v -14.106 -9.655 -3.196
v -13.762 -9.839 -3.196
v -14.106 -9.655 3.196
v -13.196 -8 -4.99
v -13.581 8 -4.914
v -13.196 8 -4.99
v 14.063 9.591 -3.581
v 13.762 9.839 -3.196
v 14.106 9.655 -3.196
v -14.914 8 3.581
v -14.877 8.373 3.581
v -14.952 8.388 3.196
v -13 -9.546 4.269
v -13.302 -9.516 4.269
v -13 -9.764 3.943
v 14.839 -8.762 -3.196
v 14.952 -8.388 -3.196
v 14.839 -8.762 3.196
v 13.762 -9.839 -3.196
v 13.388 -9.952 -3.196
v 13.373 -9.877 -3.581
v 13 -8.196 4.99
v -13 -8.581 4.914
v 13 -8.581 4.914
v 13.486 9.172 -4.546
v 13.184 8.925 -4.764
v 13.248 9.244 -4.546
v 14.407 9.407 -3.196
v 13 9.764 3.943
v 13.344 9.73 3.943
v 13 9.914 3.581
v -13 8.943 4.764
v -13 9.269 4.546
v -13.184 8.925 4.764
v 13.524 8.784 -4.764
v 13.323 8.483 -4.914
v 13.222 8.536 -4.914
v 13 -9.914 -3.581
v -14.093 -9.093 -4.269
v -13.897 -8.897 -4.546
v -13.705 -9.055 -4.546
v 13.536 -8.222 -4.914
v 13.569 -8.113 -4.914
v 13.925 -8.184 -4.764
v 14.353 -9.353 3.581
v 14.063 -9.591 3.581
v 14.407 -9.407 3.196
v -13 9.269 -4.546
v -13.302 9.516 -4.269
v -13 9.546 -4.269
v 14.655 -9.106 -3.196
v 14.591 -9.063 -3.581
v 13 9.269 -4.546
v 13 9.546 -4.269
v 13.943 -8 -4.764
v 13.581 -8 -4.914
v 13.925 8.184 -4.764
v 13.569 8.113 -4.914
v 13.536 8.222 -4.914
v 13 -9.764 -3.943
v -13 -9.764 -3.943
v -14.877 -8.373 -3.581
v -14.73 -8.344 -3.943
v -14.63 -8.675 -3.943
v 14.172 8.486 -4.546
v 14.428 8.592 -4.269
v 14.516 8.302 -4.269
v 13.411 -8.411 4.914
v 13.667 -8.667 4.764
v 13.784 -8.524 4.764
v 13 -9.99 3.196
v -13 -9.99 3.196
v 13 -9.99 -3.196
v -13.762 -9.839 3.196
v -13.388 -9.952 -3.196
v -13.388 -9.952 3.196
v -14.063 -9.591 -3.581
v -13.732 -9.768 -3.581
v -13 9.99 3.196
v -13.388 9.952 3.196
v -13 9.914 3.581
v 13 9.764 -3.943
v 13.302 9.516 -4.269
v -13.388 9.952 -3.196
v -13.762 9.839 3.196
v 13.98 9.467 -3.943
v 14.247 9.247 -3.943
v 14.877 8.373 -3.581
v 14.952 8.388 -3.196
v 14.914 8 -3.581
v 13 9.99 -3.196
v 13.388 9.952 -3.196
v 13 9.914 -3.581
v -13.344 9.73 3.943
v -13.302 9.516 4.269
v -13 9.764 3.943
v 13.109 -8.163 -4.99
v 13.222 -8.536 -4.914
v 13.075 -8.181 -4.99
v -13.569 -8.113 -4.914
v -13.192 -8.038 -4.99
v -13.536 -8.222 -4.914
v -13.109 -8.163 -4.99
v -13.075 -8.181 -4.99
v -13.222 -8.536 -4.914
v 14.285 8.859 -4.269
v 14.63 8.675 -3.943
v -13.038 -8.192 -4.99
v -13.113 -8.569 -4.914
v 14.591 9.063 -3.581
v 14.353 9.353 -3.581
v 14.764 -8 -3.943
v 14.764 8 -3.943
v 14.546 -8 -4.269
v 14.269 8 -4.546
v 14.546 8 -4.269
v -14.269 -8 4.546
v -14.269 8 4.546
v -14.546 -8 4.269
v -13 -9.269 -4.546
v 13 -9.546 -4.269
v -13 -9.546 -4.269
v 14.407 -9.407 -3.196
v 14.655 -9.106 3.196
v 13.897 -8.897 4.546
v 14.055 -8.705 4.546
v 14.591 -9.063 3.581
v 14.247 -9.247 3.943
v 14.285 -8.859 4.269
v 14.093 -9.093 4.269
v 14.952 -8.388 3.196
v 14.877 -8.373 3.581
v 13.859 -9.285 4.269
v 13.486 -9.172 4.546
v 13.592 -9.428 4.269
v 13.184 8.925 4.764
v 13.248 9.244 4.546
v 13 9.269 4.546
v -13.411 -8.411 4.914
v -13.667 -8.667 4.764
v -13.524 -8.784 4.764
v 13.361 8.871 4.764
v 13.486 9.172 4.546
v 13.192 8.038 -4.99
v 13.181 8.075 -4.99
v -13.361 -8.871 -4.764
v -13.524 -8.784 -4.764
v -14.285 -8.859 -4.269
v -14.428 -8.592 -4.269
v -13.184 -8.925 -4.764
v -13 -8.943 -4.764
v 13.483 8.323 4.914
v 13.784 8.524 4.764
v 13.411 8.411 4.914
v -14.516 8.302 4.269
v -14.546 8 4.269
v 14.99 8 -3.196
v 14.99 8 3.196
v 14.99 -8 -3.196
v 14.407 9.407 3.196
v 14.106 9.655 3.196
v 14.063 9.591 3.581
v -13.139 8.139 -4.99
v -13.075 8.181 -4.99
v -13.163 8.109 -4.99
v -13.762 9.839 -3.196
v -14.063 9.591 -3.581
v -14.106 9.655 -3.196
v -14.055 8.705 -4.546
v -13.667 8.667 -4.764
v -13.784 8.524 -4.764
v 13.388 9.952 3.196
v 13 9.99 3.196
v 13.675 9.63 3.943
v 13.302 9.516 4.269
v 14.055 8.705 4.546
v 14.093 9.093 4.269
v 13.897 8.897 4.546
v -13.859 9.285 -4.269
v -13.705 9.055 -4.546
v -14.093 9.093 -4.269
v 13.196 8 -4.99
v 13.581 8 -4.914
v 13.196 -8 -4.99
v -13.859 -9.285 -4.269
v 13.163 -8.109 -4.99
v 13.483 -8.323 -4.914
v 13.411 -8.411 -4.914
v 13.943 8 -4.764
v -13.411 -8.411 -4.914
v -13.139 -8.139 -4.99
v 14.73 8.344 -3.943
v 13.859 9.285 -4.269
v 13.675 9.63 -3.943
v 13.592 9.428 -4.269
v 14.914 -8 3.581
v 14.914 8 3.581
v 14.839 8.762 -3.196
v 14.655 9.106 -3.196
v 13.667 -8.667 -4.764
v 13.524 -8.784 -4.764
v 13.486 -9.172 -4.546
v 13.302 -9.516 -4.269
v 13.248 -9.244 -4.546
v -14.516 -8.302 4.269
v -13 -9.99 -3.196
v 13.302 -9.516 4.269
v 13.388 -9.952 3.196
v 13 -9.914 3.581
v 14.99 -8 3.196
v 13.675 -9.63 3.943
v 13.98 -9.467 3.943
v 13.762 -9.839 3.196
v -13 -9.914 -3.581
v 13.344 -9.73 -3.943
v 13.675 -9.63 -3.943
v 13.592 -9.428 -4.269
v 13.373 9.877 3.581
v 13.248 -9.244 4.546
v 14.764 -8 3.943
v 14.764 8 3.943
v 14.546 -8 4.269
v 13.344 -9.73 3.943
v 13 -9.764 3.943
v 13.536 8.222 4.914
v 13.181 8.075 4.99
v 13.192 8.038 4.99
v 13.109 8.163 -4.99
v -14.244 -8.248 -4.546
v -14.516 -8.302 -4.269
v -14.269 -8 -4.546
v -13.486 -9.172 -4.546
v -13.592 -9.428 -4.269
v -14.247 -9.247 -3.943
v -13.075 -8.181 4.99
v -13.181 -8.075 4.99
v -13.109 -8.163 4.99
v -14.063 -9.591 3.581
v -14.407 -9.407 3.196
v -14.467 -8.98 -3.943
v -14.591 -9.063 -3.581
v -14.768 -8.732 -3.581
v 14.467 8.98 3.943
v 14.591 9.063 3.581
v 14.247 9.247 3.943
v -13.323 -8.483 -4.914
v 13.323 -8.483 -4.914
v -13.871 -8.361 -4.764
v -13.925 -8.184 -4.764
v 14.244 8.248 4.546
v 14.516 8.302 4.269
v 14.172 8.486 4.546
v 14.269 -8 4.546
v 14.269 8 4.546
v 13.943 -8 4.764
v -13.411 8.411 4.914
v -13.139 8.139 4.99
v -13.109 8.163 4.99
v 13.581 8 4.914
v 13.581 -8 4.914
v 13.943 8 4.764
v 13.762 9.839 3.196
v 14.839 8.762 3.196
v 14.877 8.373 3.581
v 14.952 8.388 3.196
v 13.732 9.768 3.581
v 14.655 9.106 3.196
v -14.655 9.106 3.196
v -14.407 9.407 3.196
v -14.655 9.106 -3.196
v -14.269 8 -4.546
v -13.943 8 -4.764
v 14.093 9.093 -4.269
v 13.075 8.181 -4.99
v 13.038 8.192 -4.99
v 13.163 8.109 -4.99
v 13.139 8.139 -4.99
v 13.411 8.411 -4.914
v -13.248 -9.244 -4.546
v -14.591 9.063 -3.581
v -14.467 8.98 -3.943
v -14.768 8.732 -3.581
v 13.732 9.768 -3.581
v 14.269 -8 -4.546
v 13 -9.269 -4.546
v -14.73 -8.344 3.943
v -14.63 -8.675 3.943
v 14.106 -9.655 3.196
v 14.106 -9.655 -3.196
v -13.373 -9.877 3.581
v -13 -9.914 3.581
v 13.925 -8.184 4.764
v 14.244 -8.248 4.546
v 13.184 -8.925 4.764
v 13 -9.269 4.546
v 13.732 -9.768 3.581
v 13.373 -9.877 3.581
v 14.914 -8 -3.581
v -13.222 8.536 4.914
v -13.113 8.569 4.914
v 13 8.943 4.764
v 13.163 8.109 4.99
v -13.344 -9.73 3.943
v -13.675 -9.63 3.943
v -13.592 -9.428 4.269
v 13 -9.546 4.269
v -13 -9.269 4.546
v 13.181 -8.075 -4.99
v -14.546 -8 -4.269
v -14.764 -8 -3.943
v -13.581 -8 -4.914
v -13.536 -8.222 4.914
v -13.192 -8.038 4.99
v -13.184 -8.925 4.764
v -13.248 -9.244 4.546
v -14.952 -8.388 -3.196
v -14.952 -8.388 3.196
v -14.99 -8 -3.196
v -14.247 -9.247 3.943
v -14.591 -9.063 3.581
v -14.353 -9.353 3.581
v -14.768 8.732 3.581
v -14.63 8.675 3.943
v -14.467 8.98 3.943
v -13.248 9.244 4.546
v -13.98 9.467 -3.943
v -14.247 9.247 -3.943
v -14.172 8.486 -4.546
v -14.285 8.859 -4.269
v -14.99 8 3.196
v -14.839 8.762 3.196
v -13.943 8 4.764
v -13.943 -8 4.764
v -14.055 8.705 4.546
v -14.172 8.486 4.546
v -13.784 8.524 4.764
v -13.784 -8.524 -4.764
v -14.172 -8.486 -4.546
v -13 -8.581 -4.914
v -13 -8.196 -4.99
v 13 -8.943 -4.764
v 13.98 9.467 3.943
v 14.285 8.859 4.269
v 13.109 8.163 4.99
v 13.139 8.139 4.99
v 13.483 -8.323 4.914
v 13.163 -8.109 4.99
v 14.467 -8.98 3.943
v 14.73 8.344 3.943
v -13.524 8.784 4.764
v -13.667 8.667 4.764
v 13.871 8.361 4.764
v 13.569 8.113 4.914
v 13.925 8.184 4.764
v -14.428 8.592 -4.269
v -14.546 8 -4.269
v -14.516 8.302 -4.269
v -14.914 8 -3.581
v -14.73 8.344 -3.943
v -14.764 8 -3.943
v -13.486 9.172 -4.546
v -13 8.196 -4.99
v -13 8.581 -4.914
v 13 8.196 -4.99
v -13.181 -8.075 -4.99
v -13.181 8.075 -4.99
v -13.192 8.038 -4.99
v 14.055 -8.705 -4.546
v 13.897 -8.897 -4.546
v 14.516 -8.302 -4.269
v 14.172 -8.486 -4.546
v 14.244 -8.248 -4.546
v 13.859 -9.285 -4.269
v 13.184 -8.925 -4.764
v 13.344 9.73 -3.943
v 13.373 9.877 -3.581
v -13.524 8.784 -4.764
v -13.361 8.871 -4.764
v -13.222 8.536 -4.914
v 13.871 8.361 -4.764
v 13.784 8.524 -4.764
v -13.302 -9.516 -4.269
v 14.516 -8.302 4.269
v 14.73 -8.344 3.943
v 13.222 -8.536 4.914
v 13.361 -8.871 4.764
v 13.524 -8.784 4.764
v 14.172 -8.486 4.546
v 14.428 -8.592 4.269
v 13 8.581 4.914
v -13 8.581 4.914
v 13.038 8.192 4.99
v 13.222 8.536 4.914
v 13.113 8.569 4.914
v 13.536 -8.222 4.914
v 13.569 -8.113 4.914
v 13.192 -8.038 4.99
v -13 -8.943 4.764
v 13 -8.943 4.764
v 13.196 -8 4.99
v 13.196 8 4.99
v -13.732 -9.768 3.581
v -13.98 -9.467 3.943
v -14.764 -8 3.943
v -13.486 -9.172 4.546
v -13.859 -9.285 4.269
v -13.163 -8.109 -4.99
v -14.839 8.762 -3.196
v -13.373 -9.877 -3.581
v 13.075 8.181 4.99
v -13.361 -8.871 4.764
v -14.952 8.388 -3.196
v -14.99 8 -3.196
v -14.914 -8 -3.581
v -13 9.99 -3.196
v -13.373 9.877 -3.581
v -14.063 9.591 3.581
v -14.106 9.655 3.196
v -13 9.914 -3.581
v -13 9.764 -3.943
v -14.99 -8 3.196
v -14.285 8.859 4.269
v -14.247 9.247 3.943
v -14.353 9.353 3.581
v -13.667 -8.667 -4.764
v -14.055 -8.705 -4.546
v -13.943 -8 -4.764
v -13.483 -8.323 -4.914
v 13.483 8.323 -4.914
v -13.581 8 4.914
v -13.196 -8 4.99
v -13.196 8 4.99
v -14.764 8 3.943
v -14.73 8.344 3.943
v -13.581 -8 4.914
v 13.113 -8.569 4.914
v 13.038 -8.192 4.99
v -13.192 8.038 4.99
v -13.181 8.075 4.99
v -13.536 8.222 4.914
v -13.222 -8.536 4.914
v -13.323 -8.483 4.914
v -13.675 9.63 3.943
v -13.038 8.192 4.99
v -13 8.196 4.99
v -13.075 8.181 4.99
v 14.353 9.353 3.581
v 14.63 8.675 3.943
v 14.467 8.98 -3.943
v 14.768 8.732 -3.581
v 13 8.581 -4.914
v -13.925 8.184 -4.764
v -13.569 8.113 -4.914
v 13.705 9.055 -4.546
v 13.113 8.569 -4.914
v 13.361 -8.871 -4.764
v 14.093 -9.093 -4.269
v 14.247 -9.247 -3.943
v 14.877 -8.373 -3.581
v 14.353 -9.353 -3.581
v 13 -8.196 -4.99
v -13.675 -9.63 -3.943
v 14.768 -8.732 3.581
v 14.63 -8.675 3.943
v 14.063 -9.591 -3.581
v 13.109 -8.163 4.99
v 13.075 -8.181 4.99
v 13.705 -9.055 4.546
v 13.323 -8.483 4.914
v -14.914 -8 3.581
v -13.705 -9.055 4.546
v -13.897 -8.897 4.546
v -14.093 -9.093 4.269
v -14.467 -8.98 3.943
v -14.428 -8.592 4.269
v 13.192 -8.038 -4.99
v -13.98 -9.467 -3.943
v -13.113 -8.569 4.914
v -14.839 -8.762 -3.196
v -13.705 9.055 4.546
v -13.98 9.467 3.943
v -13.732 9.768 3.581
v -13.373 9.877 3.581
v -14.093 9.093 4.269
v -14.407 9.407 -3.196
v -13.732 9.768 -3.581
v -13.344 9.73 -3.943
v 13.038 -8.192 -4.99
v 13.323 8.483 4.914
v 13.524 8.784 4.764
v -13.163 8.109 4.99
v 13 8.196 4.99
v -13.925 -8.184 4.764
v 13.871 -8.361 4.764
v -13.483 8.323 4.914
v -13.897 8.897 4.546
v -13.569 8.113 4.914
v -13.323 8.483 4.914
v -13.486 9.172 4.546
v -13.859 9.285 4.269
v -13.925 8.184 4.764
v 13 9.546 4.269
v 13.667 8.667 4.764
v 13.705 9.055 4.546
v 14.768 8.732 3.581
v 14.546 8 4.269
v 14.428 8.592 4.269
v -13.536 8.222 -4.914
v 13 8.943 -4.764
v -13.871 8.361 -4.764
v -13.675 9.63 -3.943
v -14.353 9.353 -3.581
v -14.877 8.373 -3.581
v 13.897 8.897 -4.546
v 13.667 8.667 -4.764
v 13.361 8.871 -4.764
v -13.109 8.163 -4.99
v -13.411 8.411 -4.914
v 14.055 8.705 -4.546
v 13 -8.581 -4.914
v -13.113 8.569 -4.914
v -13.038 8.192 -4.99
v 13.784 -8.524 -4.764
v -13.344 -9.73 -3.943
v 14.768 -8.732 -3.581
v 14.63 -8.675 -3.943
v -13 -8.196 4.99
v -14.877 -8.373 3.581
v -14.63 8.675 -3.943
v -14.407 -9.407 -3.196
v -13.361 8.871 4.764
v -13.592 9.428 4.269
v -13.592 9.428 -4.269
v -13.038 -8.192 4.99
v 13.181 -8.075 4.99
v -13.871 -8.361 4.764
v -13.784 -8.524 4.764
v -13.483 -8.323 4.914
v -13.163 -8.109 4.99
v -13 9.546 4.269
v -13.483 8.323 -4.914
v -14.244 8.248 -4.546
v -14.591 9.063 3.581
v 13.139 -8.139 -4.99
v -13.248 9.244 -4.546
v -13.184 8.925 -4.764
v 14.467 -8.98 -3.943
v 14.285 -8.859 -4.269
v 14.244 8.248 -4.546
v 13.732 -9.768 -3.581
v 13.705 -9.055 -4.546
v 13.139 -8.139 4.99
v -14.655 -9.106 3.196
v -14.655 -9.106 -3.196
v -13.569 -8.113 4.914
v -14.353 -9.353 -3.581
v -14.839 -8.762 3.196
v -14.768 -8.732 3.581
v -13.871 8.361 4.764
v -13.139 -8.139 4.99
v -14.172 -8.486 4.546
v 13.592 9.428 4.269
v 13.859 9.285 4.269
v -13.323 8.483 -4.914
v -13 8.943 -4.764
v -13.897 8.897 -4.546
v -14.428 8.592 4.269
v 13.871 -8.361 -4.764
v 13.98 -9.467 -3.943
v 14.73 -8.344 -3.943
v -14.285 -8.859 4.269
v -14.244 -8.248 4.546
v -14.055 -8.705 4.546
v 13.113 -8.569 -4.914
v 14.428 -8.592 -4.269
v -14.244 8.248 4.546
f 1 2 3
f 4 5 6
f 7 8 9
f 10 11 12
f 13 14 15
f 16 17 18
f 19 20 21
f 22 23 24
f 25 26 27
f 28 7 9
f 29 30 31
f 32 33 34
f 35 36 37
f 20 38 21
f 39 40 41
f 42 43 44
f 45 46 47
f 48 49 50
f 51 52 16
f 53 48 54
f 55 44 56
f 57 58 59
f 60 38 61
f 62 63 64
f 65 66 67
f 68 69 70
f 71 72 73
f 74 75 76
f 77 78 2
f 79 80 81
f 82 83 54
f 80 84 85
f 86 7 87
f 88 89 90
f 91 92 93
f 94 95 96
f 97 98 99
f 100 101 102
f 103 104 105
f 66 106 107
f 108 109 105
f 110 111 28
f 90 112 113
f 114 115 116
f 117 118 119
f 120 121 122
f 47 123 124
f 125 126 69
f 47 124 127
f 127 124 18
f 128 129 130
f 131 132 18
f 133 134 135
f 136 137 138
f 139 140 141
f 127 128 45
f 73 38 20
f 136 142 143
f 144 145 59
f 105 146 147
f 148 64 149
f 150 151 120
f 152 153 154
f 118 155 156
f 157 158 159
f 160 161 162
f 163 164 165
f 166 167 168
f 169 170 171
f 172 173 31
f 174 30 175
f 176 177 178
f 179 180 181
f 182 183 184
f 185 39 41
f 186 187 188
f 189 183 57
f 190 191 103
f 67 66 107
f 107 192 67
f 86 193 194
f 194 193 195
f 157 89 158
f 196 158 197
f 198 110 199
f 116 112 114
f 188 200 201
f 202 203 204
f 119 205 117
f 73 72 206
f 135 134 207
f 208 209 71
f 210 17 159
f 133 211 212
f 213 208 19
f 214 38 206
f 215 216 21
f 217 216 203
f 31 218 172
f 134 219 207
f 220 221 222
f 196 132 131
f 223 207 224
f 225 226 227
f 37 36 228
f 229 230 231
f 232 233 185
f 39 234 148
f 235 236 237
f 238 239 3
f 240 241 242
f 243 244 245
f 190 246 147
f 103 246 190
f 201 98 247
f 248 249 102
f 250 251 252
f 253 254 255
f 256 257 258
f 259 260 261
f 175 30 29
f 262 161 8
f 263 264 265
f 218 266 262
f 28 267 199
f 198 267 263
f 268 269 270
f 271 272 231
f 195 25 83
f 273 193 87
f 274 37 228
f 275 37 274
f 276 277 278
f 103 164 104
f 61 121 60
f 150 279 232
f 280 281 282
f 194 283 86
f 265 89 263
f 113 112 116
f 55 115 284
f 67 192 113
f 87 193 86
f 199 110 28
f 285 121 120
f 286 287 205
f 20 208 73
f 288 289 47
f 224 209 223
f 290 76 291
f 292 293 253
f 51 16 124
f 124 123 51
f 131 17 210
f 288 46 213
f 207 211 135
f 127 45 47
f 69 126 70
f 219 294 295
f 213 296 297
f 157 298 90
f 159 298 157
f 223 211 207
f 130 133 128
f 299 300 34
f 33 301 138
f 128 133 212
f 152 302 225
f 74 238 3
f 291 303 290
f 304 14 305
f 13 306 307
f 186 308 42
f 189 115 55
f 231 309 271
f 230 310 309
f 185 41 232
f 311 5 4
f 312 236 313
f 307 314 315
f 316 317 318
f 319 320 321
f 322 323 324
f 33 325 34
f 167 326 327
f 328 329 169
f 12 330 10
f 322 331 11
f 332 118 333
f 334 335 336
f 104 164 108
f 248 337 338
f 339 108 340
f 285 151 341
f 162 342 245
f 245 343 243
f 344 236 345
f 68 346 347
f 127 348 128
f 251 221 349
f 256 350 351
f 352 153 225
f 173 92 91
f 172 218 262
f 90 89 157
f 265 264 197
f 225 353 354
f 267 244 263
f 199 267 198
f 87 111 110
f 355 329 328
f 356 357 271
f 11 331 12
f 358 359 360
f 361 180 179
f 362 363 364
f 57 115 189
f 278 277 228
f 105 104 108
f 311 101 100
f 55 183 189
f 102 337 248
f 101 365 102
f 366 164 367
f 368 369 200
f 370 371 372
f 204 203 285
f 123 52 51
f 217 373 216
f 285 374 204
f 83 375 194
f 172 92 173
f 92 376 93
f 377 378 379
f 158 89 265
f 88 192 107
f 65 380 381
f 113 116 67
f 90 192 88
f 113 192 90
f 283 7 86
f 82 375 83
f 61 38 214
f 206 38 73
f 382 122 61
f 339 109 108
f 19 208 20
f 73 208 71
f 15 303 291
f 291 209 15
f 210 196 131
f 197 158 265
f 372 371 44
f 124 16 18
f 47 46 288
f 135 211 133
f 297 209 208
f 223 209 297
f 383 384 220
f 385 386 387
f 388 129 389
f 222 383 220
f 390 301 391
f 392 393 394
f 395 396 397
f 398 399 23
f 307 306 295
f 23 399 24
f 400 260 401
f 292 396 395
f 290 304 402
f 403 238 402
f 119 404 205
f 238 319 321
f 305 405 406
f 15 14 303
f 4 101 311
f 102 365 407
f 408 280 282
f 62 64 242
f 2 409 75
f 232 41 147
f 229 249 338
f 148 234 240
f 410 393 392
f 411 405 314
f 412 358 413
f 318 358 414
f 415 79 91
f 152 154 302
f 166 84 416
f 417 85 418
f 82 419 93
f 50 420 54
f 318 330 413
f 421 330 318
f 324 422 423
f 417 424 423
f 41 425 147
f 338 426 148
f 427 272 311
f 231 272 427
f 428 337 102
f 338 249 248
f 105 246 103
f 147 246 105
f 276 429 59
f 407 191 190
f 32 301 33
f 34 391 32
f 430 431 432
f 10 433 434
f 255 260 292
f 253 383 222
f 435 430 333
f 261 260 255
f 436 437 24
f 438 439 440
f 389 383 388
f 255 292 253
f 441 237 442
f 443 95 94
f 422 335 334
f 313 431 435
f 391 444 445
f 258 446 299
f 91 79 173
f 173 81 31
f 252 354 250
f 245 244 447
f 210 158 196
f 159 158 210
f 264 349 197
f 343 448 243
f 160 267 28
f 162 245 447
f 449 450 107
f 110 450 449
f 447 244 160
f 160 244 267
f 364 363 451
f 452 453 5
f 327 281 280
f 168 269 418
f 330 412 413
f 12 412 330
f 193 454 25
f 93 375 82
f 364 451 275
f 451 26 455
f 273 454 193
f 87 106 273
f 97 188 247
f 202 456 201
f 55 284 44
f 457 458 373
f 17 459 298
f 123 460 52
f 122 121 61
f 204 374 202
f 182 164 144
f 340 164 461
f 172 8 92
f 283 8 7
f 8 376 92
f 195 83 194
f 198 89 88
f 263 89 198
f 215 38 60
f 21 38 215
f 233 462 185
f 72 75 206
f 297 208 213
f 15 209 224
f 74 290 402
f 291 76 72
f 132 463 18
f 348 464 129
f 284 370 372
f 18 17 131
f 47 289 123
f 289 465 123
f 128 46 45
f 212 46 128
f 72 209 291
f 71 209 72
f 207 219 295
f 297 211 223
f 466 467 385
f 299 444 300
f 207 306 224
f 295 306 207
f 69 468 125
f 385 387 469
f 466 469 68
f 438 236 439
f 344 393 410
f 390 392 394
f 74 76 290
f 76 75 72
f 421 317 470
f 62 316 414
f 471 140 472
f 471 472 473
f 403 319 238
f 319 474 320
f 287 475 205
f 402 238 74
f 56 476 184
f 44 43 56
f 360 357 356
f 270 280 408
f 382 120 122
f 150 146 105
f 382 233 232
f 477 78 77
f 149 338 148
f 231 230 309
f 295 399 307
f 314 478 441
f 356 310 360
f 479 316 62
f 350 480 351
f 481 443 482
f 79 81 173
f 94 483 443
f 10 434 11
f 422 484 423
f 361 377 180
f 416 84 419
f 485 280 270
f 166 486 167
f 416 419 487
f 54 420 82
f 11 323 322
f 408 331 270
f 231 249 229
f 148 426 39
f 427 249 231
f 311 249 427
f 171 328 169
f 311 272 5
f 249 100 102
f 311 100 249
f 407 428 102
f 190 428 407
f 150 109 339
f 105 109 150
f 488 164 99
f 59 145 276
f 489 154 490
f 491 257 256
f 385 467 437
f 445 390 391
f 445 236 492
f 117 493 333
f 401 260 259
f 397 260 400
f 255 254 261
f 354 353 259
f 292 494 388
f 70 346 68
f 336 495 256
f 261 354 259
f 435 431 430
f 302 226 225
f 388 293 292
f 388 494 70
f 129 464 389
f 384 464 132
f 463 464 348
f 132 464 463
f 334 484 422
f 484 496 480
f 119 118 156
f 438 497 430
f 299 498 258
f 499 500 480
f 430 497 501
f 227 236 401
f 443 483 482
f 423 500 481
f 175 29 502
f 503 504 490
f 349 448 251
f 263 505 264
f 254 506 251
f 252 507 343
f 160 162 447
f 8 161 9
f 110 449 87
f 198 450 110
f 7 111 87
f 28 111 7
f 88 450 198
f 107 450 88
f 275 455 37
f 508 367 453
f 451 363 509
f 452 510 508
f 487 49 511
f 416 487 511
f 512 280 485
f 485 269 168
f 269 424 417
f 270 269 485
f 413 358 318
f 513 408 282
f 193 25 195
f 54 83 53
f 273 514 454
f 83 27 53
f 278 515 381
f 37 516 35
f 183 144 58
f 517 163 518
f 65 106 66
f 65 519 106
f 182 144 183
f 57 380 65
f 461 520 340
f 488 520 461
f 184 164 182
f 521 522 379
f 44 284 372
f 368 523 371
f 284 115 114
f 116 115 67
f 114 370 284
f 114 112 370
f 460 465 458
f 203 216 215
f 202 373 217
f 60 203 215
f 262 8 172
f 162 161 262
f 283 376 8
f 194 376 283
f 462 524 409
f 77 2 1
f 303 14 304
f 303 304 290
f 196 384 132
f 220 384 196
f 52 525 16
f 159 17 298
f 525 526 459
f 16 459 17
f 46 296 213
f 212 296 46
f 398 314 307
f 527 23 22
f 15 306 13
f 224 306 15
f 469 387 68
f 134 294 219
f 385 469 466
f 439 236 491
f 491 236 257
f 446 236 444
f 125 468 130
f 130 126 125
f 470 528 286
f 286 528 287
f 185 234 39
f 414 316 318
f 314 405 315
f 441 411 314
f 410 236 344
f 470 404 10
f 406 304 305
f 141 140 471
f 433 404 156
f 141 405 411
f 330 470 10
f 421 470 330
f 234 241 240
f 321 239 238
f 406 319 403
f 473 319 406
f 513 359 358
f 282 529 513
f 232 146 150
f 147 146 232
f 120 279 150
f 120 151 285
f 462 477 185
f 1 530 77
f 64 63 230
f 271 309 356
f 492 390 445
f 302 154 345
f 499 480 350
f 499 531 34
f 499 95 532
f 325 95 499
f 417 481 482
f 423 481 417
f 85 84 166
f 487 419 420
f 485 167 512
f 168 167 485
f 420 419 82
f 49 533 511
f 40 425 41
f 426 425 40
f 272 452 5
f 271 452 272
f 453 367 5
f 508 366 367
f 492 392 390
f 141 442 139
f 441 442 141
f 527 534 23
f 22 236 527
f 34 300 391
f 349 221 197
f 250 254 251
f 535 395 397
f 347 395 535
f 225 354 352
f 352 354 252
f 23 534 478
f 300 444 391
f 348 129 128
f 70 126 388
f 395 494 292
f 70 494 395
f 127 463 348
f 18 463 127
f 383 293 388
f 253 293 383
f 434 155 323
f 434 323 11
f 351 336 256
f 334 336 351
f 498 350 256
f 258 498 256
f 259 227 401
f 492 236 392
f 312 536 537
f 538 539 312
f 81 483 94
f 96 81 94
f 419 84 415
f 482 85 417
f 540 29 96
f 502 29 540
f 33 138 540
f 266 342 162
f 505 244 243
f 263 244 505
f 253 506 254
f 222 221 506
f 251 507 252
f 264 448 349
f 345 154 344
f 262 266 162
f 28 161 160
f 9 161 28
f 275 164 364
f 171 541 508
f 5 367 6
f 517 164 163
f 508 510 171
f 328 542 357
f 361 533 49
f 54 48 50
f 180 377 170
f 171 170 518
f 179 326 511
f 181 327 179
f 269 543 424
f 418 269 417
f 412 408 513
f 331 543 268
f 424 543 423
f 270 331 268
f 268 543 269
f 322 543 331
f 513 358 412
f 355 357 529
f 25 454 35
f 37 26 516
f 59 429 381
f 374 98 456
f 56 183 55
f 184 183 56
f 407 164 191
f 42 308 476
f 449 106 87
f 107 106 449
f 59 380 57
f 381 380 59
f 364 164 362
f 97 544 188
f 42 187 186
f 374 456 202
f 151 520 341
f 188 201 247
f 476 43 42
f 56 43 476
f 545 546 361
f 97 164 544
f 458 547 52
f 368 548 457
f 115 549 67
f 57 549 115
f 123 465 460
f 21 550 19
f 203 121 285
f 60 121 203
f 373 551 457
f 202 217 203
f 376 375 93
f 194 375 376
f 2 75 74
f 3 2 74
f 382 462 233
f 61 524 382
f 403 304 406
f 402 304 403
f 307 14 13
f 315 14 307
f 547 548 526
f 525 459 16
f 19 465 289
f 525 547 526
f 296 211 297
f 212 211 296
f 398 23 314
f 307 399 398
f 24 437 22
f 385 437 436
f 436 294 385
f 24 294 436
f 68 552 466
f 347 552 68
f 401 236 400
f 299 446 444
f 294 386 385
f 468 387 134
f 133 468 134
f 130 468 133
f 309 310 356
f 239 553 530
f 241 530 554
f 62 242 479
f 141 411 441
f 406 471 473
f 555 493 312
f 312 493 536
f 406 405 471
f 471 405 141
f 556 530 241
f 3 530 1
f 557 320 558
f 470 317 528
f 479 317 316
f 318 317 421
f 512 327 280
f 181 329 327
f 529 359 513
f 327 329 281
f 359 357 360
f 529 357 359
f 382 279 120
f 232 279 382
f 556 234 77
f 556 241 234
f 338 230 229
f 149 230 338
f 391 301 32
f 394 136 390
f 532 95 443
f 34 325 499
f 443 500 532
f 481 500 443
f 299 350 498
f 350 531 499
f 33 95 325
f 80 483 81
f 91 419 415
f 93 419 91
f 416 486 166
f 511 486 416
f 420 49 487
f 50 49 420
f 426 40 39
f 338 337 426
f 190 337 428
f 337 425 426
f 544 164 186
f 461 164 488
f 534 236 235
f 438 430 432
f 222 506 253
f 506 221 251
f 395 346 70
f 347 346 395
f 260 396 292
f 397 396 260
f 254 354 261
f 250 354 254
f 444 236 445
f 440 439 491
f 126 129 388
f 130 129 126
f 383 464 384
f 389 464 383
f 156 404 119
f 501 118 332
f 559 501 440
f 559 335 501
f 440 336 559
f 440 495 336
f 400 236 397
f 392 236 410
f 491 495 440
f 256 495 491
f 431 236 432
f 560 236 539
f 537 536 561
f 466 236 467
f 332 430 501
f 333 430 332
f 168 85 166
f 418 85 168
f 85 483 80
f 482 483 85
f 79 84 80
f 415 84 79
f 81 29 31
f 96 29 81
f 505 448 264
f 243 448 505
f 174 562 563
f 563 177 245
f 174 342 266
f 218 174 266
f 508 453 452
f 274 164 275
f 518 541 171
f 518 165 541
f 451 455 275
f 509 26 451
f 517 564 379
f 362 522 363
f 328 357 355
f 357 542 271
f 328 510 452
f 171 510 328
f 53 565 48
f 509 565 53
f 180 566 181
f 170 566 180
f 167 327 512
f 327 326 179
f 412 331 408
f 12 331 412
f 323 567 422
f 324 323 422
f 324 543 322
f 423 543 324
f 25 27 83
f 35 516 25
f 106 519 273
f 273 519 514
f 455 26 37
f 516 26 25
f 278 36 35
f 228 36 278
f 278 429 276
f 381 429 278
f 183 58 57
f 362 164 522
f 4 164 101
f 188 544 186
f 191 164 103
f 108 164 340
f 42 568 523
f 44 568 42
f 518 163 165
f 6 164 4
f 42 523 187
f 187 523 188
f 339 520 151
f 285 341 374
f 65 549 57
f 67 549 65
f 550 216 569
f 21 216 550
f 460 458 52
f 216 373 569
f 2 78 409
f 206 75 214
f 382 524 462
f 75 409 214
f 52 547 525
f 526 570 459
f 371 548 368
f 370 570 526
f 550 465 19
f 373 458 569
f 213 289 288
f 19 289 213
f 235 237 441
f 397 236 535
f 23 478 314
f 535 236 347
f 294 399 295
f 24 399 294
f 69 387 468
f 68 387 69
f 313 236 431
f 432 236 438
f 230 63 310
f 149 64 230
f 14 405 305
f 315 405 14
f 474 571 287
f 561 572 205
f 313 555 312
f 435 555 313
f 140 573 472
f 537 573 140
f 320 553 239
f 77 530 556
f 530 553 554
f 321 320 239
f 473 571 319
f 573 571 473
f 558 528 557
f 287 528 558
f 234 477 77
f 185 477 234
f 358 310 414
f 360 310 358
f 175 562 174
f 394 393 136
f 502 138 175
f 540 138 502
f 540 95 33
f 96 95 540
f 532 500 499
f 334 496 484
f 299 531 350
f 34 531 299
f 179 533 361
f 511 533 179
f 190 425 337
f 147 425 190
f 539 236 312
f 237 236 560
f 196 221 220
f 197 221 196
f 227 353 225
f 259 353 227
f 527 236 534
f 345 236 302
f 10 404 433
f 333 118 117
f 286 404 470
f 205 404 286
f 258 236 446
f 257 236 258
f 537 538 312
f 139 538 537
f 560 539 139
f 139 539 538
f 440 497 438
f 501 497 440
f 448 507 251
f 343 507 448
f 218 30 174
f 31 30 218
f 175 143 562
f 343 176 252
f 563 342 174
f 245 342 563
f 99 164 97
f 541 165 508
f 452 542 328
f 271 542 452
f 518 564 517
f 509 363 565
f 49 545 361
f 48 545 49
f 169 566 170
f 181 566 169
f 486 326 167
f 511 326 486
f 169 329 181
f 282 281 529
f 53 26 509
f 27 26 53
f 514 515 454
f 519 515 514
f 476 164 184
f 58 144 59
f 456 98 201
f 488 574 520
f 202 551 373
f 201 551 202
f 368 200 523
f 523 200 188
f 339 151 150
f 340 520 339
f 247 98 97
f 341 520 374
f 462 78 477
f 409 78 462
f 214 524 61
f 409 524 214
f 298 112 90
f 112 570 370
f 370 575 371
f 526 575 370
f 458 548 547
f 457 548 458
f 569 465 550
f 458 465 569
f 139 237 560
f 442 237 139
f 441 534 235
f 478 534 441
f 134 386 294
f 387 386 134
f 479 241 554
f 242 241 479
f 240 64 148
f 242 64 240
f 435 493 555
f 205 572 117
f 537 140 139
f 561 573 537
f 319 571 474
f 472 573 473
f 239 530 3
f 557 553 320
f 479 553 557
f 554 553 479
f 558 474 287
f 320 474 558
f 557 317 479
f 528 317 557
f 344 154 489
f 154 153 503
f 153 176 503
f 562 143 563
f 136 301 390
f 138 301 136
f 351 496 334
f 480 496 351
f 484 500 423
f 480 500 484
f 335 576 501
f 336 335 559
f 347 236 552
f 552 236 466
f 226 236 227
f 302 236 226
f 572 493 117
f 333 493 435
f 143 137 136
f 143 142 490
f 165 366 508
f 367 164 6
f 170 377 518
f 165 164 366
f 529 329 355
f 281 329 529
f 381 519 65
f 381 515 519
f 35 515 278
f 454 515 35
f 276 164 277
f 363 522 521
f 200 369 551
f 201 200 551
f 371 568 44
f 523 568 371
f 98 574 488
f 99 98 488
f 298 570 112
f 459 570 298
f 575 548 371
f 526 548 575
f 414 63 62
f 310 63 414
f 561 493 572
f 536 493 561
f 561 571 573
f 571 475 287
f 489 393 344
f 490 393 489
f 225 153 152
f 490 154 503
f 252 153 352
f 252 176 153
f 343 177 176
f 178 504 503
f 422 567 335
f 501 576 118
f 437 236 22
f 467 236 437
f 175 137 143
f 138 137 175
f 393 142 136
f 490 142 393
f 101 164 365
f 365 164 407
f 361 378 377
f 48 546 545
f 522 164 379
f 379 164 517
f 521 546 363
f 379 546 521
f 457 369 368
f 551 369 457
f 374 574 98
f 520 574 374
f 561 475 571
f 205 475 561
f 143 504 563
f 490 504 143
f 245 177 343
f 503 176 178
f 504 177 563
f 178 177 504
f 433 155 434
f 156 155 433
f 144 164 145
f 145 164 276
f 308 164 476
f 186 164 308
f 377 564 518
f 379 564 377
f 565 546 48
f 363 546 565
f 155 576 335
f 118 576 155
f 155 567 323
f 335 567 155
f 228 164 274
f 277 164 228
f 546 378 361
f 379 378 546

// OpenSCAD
// Example: parametric rounded cube

size = [30, 20, 10];
corner_r = 2;

minkowski() {
    cube(size - [corner_r, corner_r, corner_r] * 2, center = true);
    sphere(r = corner_r, $fn = 32);
}
